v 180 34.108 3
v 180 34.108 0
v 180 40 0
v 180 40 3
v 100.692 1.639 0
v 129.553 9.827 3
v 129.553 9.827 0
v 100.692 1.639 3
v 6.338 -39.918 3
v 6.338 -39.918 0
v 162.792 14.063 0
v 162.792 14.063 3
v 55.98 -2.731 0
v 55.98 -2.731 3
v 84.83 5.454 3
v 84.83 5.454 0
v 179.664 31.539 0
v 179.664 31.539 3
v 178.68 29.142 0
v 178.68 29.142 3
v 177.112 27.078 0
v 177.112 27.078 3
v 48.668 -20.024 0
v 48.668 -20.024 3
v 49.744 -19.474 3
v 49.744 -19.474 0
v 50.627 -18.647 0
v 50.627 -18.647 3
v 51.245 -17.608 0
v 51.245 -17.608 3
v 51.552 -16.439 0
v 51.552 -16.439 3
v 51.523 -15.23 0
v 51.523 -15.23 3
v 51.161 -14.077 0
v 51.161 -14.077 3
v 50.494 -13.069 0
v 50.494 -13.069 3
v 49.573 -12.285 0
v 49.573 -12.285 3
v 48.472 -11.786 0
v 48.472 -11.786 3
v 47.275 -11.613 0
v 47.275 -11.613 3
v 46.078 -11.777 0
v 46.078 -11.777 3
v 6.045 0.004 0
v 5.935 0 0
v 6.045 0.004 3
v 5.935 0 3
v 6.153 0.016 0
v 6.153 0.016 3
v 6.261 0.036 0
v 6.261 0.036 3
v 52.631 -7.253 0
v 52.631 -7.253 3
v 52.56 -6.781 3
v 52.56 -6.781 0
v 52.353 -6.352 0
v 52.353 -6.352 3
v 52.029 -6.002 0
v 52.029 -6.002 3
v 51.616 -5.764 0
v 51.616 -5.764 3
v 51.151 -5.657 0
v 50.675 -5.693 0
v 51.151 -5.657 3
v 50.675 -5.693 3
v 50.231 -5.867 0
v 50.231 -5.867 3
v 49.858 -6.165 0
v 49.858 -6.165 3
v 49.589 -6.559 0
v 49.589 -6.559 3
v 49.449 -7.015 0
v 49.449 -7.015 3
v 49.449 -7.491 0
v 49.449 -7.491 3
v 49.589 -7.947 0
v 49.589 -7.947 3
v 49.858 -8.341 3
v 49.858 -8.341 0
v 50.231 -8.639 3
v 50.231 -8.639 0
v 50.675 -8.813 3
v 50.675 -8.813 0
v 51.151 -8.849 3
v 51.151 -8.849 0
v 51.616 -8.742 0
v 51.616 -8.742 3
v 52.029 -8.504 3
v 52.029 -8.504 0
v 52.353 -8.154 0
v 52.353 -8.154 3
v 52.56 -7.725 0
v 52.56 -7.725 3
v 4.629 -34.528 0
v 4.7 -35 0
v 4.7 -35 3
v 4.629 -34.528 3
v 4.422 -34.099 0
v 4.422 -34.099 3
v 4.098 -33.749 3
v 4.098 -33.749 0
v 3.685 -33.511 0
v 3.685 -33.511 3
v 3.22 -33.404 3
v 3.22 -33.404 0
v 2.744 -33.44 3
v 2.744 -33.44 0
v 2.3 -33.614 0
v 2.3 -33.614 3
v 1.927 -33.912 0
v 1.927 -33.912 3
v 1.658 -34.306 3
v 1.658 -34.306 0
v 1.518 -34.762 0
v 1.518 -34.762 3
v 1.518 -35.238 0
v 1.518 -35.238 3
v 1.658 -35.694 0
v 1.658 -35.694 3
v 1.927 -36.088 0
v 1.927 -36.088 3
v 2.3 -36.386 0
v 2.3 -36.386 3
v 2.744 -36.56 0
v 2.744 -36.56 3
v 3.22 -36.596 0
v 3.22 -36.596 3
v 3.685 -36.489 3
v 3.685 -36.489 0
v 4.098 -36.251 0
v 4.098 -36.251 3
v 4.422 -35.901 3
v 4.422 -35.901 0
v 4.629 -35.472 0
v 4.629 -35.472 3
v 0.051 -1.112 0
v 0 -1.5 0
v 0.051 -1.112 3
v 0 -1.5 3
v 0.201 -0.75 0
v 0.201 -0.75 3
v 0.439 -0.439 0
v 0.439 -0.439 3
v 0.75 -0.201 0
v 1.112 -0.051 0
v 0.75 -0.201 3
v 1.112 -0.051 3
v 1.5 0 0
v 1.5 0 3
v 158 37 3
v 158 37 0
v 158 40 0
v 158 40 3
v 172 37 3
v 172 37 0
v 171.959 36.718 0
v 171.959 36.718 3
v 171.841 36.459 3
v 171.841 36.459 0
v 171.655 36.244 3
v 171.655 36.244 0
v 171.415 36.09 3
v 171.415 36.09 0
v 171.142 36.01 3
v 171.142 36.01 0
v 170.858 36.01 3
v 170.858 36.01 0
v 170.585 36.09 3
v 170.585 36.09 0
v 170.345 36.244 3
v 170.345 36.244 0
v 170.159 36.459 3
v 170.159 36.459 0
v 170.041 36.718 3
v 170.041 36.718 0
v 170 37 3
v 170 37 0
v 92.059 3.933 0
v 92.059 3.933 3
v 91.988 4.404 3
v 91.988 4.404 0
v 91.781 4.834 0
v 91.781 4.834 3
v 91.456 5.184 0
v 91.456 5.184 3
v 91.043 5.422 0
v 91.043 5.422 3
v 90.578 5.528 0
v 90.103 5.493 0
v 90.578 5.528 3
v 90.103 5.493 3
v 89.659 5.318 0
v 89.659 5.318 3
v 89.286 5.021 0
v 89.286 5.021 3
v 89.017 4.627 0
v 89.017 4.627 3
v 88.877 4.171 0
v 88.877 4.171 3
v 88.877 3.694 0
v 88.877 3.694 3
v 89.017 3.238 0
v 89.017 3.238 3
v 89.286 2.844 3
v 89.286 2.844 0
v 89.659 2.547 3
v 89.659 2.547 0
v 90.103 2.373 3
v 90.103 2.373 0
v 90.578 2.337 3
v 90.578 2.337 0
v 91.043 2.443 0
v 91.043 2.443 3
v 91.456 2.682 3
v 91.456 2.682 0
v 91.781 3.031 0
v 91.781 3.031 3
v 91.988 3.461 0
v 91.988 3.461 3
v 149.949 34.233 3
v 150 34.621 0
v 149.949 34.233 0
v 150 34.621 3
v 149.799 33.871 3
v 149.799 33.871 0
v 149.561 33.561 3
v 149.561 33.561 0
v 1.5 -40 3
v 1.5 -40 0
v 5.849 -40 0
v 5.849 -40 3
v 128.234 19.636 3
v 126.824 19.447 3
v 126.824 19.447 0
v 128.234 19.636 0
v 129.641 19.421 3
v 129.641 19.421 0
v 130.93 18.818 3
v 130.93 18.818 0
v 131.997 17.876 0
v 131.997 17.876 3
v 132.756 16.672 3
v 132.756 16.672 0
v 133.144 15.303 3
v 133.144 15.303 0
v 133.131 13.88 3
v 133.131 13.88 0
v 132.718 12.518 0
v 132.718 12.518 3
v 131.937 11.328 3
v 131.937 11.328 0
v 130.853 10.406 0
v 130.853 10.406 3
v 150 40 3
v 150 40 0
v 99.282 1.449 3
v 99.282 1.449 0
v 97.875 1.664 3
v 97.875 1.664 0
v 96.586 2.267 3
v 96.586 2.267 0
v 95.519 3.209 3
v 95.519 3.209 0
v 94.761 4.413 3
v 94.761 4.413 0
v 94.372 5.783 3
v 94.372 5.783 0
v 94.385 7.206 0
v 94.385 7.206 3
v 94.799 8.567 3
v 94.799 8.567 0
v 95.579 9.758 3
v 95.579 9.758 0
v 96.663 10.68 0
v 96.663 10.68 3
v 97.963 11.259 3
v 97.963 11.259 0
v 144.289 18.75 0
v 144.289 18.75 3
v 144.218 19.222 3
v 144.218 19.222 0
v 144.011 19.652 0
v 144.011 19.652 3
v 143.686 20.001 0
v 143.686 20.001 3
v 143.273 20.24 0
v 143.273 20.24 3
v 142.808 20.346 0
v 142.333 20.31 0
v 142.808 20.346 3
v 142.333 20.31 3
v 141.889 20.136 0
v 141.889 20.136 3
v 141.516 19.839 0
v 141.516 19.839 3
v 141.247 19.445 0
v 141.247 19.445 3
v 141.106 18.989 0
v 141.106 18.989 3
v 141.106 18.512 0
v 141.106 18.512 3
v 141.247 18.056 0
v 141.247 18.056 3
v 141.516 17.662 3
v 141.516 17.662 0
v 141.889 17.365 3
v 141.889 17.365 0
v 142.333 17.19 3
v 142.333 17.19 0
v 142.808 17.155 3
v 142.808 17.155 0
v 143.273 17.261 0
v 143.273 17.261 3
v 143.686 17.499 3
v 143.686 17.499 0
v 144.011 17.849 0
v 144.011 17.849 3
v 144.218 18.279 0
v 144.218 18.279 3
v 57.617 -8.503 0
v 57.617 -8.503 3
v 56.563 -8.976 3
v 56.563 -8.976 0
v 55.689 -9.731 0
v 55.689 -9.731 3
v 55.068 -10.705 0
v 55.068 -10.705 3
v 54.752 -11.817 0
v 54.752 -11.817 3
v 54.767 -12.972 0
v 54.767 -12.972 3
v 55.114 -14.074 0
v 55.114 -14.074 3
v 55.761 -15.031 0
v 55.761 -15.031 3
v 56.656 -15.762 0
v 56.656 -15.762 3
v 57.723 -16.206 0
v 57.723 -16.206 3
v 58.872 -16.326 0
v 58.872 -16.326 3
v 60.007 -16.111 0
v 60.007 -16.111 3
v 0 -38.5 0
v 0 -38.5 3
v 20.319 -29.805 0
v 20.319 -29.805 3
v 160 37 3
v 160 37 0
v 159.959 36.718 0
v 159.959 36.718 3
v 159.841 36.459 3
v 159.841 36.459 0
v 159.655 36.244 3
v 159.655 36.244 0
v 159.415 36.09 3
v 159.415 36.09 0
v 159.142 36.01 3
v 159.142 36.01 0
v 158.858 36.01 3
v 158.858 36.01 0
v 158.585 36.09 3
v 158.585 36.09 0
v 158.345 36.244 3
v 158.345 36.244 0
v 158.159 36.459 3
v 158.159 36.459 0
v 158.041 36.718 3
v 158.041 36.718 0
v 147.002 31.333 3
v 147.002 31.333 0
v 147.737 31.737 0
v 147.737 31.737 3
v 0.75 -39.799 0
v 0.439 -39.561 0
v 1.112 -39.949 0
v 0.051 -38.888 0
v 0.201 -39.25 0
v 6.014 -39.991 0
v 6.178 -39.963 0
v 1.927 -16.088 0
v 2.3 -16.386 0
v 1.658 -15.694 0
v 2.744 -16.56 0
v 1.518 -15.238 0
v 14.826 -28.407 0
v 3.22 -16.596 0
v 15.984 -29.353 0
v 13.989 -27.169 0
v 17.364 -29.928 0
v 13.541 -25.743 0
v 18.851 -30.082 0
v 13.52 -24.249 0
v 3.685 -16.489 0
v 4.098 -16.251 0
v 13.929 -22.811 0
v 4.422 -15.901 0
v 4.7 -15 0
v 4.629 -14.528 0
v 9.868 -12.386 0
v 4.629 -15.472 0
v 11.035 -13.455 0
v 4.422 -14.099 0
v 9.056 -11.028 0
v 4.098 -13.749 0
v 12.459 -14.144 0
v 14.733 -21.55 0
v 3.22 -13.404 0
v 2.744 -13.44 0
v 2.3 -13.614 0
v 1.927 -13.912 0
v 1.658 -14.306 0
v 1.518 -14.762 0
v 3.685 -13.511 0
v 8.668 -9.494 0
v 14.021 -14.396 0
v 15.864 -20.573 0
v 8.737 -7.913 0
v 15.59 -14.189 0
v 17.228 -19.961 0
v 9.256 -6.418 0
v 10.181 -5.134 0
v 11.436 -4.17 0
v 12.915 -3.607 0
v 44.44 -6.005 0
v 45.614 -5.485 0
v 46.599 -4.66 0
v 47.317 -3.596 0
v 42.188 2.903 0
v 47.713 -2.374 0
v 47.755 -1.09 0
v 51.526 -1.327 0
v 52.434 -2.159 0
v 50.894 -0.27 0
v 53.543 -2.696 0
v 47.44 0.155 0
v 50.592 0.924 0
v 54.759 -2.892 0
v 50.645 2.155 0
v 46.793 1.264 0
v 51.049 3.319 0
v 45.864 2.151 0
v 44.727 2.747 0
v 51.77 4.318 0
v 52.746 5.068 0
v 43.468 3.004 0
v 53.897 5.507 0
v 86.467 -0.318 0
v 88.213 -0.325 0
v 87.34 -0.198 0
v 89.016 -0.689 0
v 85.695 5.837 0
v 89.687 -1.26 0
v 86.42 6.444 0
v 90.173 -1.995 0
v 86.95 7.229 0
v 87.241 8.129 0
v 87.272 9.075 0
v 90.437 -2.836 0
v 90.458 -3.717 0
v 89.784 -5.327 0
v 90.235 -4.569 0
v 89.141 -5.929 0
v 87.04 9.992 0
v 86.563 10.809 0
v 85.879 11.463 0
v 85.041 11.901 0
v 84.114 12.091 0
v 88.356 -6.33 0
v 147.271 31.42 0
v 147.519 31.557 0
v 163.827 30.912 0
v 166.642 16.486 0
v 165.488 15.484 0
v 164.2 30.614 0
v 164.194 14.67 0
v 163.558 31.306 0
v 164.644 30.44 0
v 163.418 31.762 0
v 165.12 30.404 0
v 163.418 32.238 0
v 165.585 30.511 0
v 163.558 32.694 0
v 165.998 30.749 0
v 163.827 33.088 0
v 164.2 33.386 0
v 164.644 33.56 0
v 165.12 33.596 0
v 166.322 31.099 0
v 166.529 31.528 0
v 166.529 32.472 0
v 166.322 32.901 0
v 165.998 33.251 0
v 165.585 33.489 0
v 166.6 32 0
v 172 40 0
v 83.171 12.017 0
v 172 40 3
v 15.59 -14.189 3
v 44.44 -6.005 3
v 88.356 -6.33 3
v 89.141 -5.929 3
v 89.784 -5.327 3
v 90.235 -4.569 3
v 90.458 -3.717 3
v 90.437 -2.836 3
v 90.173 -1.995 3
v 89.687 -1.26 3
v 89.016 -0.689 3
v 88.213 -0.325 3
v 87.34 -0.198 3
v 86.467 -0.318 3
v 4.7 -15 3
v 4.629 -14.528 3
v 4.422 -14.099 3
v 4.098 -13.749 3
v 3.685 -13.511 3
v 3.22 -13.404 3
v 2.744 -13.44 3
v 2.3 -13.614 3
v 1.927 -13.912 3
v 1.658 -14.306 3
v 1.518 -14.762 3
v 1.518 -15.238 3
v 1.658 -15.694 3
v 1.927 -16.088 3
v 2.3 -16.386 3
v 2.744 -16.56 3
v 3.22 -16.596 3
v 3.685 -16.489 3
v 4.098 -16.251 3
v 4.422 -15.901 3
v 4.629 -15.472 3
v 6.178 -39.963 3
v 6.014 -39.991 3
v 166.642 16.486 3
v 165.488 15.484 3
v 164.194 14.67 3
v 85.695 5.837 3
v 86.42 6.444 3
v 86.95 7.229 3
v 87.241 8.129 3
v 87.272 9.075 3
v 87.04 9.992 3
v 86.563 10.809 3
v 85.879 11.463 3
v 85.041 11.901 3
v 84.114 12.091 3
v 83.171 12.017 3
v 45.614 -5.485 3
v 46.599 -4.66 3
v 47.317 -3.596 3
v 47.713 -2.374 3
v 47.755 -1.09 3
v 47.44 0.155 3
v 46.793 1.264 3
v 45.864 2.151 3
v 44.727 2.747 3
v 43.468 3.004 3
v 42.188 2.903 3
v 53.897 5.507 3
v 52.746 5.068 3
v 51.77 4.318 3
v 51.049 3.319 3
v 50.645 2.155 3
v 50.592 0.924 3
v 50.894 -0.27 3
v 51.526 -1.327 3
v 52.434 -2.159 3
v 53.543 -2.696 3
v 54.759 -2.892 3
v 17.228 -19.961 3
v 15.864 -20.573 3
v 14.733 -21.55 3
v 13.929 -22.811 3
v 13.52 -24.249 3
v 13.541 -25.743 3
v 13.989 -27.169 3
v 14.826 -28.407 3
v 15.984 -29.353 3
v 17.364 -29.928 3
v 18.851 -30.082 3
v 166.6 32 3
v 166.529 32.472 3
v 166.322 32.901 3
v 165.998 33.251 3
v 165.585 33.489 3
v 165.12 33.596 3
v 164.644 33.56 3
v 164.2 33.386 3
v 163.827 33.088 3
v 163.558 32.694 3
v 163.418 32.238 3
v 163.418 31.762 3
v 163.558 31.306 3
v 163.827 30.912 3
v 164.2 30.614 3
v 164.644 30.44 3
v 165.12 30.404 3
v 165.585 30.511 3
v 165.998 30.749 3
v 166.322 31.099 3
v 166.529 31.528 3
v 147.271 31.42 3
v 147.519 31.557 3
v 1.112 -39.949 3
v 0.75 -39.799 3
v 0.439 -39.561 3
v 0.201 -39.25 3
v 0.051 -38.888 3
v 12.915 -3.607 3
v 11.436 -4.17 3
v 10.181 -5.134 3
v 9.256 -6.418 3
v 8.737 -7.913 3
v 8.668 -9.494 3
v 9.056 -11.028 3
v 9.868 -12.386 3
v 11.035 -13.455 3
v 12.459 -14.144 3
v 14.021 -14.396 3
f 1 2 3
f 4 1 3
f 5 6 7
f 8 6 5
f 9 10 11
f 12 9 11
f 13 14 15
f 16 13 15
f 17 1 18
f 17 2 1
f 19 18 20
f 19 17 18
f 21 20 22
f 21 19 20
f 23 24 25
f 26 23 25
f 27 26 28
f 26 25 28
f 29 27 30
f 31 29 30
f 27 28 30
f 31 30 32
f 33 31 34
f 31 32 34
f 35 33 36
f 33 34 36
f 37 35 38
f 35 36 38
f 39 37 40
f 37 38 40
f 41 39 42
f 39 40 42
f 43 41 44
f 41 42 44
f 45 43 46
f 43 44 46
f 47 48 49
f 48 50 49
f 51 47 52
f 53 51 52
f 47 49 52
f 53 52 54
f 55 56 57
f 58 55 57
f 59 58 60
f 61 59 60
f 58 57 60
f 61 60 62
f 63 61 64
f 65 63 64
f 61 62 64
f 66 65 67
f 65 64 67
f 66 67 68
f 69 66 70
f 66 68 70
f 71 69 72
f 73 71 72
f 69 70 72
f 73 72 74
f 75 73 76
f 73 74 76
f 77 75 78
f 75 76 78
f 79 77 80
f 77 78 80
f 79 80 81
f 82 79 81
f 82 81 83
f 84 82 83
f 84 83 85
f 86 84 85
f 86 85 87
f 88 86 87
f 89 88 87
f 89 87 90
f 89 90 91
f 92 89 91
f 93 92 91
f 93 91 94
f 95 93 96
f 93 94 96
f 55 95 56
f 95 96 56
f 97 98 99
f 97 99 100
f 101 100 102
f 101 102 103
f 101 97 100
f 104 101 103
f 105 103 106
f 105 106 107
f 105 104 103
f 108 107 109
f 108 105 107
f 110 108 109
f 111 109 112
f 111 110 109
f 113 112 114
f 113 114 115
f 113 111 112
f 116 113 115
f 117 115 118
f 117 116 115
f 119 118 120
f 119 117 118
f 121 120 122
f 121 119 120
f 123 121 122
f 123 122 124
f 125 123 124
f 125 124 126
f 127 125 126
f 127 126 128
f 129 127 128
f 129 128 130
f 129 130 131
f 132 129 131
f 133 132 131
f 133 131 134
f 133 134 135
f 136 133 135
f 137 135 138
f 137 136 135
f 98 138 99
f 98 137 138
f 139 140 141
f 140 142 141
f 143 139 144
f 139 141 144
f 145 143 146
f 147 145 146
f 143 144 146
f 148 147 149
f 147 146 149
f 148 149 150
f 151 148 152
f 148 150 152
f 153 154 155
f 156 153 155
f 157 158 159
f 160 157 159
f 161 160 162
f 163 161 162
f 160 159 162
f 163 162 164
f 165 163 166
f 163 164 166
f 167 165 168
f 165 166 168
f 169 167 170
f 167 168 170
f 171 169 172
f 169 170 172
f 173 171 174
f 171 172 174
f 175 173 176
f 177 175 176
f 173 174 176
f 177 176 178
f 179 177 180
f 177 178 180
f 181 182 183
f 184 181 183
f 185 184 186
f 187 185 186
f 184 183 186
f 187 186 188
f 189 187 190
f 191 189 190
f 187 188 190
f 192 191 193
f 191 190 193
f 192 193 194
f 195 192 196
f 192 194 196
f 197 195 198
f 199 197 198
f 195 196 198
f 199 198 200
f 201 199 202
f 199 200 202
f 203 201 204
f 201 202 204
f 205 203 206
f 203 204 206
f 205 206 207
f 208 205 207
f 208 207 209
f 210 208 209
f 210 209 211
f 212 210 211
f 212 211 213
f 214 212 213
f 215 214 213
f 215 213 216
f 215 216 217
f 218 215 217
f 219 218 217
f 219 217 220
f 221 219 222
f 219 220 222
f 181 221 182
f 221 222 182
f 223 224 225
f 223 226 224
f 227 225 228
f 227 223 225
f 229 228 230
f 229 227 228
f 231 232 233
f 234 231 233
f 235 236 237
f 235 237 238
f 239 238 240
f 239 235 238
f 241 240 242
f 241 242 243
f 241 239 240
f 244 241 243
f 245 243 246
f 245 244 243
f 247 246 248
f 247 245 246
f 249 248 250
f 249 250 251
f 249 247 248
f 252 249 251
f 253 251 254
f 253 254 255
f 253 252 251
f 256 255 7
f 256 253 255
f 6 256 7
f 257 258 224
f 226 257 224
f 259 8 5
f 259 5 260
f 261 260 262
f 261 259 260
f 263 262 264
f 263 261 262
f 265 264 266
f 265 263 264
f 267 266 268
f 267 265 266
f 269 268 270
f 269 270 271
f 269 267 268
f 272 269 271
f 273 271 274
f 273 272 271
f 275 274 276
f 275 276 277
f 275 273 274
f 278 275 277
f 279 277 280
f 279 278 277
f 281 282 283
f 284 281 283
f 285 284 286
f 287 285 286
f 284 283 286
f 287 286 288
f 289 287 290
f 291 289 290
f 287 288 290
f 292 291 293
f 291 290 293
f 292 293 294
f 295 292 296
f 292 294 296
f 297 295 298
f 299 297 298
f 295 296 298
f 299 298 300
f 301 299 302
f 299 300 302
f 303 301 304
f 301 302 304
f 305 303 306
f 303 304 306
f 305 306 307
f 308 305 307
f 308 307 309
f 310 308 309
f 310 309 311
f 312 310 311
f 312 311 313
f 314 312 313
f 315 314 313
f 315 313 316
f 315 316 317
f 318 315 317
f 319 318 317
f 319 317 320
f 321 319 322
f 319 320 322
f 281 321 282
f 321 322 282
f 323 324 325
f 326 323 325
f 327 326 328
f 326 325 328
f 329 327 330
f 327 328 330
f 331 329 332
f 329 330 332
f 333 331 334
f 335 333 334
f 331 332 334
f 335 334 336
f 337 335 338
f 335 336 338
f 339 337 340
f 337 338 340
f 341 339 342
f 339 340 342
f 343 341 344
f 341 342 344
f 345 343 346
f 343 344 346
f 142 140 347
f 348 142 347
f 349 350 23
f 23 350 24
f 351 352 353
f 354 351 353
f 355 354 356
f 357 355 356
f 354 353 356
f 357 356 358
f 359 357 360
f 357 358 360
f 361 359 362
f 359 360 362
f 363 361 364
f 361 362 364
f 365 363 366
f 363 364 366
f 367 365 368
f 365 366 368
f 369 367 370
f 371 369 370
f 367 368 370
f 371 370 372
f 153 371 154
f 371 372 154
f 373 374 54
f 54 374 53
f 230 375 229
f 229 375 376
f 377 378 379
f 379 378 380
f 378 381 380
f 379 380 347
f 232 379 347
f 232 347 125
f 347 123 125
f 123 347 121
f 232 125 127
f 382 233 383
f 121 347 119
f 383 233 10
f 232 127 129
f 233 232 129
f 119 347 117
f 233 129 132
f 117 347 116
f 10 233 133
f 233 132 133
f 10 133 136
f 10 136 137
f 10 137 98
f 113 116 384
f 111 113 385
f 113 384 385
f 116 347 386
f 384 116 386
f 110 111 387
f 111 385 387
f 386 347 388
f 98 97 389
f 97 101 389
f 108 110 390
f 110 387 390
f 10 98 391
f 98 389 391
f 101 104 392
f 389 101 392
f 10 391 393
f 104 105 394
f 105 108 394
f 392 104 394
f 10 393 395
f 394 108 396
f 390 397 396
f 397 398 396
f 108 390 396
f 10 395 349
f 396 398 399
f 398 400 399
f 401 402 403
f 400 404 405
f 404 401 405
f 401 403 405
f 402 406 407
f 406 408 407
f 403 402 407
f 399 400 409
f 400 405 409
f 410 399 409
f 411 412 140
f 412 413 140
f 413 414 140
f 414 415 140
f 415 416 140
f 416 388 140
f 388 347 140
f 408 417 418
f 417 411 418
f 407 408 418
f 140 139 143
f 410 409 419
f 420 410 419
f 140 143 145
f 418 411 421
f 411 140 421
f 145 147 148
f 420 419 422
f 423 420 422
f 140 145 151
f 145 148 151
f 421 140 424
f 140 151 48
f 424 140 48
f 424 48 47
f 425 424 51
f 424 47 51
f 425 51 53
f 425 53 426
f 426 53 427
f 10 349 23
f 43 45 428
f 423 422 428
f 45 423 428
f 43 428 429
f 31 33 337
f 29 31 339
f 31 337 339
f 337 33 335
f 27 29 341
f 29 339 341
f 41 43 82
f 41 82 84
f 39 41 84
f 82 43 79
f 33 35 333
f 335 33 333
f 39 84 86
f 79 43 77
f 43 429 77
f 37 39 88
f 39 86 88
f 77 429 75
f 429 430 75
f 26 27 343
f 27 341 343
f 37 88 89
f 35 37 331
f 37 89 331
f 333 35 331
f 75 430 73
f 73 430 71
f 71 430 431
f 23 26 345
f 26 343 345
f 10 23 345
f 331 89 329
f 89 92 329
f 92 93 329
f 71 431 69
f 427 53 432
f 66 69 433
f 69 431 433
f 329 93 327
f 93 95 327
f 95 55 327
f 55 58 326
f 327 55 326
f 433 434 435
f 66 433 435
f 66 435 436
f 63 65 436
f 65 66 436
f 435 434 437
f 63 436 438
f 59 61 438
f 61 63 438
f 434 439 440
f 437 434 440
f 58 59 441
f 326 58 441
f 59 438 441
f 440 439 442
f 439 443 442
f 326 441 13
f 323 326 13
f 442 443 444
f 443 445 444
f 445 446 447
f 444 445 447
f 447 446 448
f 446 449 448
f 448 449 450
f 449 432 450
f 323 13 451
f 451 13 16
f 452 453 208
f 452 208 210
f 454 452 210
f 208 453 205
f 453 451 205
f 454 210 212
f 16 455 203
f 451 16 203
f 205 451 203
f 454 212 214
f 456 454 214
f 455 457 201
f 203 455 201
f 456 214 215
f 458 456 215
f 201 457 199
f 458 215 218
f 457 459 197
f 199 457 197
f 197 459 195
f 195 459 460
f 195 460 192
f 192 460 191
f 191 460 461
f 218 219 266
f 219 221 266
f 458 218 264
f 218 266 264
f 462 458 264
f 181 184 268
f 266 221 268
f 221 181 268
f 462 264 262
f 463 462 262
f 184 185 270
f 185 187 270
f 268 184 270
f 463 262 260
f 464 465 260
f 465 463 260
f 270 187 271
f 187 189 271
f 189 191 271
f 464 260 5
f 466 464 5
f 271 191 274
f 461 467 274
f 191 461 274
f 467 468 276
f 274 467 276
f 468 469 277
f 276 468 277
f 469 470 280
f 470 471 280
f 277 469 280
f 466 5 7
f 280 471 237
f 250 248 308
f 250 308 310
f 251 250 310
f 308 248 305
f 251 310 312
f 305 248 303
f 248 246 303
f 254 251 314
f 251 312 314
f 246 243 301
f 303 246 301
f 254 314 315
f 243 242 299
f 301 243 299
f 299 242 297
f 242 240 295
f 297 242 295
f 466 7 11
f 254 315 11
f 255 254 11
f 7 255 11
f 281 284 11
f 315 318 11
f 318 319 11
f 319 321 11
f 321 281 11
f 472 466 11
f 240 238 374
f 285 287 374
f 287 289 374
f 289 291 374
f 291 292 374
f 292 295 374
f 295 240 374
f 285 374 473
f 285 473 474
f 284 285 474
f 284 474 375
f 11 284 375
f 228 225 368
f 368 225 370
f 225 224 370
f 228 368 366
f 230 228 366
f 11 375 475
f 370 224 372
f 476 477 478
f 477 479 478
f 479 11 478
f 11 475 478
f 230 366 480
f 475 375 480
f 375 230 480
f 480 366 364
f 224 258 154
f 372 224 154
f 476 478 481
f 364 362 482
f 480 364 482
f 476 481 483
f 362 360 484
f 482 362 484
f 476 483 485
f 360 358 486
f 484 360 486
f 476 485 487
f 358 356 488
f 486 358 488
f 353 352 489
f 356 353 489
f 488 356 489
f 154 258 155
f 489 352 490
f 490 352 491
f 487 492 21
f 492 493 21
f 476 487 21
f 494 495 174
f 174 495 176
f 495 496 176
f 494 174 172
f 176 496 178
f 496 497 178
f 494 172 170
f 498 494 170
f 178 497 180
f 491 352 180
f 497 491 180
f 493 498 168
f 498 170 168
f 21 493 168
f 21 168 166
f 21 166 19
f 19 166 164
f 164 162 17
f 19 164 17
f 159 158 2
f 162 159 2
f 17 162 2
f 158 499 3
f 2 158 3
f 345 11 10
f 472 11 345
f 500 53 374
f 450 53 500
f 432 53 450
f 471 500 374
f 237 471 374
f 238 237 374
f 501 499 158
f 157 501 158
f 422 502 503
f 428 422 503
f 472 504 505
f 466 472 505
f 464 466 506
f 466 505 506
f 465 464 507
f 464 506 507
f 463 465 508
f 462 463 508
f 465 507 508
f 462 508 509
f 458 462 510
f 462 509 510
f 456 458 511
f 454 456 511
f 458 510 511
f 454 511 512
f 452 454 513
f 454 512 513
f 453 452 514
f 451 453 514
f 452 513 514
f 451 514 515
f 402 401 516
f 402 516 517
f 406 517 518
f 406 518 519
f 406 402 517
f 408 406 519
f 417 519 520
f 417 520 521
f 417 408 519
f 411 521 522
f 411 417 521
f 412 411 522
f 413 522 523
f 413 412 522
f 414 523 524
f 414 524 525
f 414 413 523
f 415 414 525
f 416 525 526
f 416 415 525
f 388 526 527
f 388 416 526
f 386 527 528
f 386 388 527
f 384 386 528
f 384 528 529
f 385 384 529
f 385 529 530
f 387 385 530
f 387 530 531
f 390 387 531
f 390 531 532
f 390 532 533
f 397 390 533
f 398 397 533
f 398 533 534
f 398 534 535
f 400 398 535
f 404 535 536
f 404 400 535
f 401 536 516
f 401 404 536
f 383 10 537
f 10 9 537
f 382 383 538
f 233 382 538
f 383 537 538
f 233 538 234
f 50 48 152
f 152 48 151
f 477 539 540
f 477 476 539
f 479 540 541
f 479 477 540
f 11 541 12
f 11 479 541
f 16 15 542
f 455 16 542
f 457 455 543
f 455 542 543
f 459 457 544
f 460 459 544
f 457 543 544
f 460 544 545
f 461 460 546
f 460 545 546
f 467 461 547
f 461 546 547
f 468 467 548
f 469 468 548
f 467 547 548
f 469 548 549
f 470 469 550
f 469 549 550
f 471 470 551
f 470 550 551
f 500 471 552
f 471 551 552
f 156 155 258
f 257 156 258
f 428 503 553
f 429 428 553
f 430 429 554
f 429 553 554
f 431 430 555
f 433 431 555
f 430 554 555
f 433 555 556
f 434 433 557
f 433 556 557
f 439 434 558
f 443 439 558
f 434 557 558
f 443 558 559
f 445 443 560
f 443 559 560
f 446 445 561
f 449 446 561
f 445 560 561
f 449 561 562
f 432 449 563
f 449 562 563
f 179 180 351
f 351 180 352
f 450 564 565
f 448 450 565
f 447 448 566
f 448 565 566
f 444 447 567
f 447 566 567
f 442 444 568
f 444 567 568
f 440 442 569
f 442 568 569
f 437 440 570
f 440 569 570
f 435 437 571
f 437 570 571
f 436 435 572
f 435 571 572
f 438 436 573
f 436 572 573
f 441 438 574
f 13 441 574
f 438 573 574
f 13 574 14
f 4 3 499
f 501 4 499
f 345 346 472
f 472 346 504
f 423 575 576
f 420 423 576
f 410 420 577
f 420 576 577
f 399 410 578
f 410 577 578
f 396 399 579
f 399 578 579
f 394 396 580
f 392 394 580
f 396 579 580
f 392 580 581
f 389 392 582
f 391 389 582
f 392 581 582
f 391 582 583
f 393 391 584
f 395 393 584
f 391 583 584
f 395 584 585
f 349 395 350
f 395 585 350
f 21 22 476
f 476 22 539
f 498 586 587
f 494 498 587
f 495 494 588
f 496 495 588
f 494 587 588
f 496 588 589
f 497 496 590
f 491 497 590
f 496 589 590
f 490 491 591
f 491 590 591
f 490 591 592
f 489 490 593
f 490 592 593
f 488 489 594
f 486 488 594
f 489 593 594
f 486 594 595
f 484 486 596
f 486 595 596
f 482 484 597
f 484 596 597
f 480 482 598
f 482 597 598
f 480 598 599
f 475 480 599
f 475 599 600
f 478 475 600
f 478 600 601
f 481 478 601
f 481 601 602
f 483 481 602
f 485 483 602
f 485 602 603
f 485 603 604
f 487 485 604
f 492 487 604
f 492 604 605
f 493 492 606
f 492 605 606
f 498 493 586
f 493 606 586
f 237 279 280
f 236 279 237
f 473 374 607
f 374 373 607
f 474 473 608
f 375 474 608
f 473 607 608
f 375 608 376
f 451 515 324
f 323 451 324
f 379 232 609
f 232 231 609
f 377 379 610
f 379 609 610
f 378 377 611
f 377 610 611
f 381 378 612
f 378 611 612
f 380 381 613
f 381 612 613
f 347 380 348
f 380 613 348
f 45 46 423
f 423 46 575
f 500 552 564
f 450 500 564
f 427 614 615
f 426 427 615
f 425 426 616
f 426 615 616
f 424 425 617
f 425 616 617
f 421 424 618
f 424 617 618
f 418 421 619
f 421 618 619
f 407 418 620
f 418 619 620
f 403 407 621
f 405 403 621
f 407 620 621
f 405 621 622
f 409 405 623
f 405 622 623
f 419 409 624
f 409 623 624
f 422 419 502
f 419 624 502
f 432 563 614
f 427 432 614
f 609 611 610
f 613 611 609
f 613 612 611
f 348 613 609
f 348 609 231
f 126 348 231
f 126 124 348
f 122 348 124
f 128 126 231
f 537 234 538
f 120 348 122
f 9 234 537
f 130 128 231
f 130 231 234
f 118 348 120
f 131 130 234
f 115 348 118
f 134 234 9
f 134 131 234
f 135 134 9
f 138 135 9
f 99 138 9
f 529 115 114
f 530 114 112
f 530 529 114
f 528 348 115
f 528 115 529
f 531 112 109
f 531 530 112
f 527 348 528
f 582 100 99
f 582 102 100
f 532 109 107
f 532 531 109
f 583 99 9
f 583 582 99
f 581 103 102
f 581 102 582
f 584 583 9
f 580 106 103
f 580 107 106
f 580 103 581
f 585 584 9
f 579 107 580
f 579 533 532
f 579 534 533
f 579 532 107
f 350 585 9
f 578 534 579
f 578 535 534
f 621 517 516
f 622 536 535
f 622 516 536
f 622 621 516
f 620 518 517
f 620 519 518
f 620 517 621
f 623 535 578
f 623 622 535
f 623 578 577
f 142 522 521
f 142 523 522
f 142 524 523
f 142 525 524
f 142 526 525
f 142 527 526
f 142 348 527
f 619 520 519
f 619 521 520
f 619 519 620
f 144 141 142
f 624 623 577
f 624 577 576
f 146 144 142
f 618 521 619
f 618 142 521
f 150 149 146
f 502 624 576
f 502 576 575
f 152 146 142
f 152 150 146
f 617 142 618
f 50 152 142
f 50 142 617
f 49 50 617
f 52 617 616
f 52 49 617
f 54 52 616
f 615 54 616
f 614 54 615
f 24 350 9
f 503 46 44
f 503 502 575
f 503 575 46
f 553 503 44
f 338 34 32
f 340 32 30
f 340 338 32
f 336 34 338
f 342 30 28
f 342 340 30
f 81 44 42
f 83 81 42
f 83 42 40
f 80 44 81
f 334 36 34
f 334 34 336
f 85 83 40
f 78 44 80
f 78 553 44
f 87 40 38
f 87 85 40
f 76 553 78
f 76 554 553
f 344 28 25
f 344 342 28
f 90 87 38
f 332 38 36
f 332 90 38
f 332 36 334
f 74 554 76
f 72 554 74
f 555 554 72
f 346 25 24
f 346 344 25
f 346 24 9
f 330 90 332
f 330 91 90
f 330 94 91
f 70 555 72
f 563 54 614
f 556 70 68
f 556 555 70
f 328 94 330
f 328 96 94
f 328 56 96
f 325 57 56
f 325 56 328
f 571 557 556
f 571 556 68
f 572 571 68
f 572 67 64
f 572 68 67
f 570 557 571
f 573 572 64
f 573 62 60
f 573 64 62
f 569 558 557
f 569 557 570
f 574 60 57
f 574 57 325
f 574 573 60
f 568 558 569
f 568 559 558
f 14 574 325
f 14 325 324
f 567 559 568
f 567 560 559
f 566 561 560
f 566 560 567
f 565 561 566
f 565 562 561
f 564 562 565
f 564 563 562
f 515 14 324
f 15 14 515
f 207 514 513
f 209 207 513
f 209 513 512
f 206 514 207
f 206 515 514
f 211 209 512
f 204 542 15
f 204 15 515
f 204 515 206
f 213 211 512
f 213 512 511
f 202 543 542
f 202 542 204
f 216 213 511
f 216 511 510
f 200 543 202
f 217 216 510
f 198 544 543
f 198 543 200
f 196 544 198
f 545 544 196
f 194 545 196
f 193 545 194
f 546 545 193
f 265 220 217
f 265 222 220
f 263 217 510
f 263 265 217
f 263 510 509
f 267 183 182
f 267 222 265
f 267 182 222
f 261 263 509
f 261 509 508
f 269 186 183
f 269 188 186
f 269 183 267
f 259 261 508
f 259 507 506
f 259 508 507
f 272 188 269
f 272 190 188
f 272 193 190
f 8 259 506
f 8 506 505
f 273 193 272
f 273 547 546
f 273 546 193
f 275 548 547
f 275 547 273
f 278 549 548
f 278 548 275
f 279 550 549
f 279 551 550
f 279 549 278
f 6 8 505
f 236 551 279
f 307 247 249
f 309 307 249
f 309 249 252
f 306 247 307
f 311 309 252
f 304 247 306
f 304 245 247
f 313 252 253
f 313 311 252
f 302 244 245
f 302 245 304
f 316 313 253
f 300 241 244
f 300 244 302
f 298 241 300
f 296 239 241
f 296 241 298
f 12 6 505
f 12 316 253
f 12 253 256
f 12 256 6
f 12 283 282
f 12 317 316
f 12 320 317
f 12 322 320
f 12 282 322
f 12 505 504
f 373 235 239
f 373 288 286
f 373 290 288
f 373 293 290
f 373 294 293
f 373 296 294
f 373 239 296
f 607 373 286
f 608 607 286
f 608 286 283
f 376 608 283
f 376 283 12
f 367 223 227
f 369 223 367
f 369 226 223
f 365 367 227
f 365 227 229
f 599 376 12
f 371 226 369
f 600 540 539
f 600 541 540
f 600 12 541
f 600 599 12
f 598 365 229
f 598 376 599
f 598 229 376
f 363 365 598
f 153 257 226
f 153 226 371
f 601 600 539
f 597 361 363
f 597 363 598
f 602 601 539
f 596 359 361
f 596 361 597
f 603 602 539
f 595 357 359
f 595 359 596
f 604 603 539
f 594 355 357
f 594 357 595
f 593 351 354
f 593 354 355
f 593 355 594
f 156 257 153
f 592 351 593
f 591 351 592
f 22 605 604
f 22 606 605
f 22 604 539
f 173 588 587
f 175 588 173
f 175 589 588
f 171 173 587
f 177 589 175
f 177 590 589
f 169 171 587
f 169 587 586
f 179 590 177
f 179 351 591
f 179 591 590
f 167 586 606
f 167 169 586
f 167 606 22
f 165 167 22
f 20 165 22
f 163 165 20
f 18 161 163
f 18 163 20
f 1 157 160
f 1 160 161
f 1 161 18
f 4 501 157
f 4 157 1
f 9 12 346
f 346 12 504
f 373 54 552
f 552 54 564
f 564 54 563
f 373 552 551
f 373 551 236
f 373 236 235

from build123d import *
from OCP.BRepFilletAPI import BRepFilletAPI_MakeChamfer

# Parameters (mm, degrees)
SKETCH_1_R          = 1.6
EXTRUDE_1_DEPTH     = 3
SKETCH_2_R          = 1.6
CUT_EXTRUDE_1_DEPTH = 3
CHAMFER_1_SIZE      = 2
CHAMFER_1_SIZE2     = 3.230198514
CHAMFER_1_SIZE2_2   = 2.634764865
SKETCH_3_R          = 1.6
CUT_EXTRUDE_2_DEPTH = 3
CUT_EXTRUDE_3_DEPTH = 3
FILLET_1_R          = 10
FILLET_2_R          = 1.5


with BuildPart() as part:
    # 草图1 → 凸台-拉伸1 (new body)
    with BuildSketch(Plane.XY):
        with BuildLine():
            Line((150, 32), (6.1, 0))
            Line((6.1, 0), (0, 0))
            Line((0, 0), (0, -40))
            Line((0, -40), (6.1, -40))
            Line((6.1, -40), (180, 20))
            Line((180, 20), (180, 40))
            Line((180, 40), (172, 40))
            Line((172, 40), (172, 37))
            ThreePointArc((172, 37), (171, 36), (170, 37))
            Line((170, 37), (160, 37))
            ThreePointArc((160, 37), (159, 36), (158, 37))
            Line((158, 37), (158, 40))
            Line((158, 40), (150, 40))
            Line((150, 40), (150, 32))
        make_face()
        with Locations((3.1, -35)):
            Circle(SKETCH_1_R, mode=Mode.SUBTRACT)
        with Locations((3.1, -15)):
            Circle(SKETCH_1_R, mode=Mode.SUBTRACT)
    extrude(amount=EXTRUDE_1_DEPTH)

    # 草图2 → 切除-拉伸1 (cut)
    with BuildSketch(Plane.XY.offset(3)):
        with Locations((165, 32)):
            Circle(SKETCH_2_R)
    extrude(amount=-CUT_EXTRUDE_1_DEPTH, mode=Mode.SUBTRACT)

    # 倒角1: one chamfer whose edges measure the first distance from different faces: ONE call of the kernel's chamfer builder (chamfer() names one face for all edges)
    chamfer_1_edges_1 = [part.edges().sort_by_distance(p)[0] for p in [
        (180, 20, 1.5),
    ]]
    chamfer_1_side_1 = [part.faces().sort_by_distance(p)[0] for p in [
        (93.05, -10, 1.5),
    ]]
    chamfer_1_edges_2 = [part.edges().sort_by_distance(p)[0] for p in [
        (150, 32, 1.5),
    ]]
    chamfer_1_side_2 = [part.faces().sort_by_distance(p)[0] for p in [
        (150, 36, 1.5),
    ]]
    chamfer_1 = BRepFilletAPI_MakeChamfer(part.part.solid().wrapped)
    for e in chamfer_1_edges_1:
        chamfer_1.Add(CHAMFER_1_SIZE, CHAMFER_1_SIZE2, e.wrapped, chamfer_1_side_1[0].wrapped)  # the first distance lies on this face
    for e in chamfer_1_edges_2:
        chamfer_1.Add(CHAMFER_1_SIZE, CHAMFER_1_SIZE2_2, e.wrapped, chamfer_1_side_2[0].wrapped)  # the first distance lies on this face
    add(Compound.cast(chamfer_1.Shape()), mode=Mode.REPLACE)

    # 草图3 → 切除-拉伸2 (cut)
    with BuildSketch(Plane.XY.offset(3)):
        with Locations((51.030979005, -7.253024477)):
            Circle(SKETCH_3_R)
        with Locations((90.458641741, 3.932653266)):
            Circle(SKETCH_3_R)
        with Locations((142.688604417, 18.75035968)):
            Circle(SKETCH_3_R)
        with BuildLine():
            Line((20.319493435, -29.80466571), (48.667912828, -20.023727449))
            ThreePointArc((48.667912828, -20.023727449), (51.382781252, -14.640684155), (46.077566644, -11.776707266))
            Line((46.077566644, -11.776707266), (17.22778338, -19.961427236))
            ThreePointArc((17.22778338, -19.961427236), (13.712756492, -26.472643184), (20.319493435, -29.80466571))
        make_face()
        with BuildLine():
            Line((97.96293832, 11.258954093), (126.823953345, 19.446860527))
            ThreePointArc((126.823953345, 19.446860527), (132.998773588, 16.001342428), (129.553255489, 9.826522185))
            Line((129.553255489, 9.826522185), (100.692240465, 1.638615751))
            ThreePointArc((100.692240465, 1.638615751), (94.517420222, 5.08413385), (97.96293832, 11.258954093))
        make_face()
        with BuildLine():
            Line((60.007280586, -16.111352144), (88.355699979, -6.330413883))
            ThreePointArc((88.355699979, -6.330413883), (90.334917033, -2.406020717), (86.467263213, -0.318099309))
            Line((86.467263213, -0.318099309), (57.617479949, -8.502819279))
            ThreePointArc((57.617479949, -8.502819279), (54.900467894, -13.53579706), (60.007280586, -16.111352144))
        make_face()
        with BuildLine():
            Line((15.590202093, -14.189224231), (44.439985357, -6.004504261))
            ThreePointArc((44.439985357, -6.004504261), (47.641256823, -0.456756962), (42.188030072, 2.902998549))
            Line((42.188030072, 2.902998549), (12.91477289, -3.60669033))
            ThreePointArc((12.91477289, -3.60669033), (8.806536259, -10.274778475), (15.590202093, -14.189224231))
        make_face()
        with BuildLine():
            Line((55.979898663, -2.730616274), (84.829681926, 5.454103696))
            ThreePointArc((84.829681926, 5.454103696), (87.188167139, 9.5413172), (83.170590126, 12.016562981))
            Line((83.170590126, 12.016562981), (53.897332945, 5.506874101))
            ThreePointArc((53.897332945, 5.506874101), (50.699463699, 0.316405313), (55.979898663, -2.730616274))
        make_face()
    extrude(amount=-CUT_EXTRUDE_2_DEPTH, mode=Mode.SUBTRACT)

    # 草图4 → 切除-拉伸3 (cut)
    with BuildSketch(Plane.XY.offset(3)):
        Polygon((180, 30), (165, 14.824611846), (178.109369602, 19.347683589), (180, 23.230198514), align=None)
    extrude(amount=-CUT_EXTRUDE_3_DEPTH, mode=Mode.SUBTRACT)

    # 圆角1
    fillet_1_edges = [part.edges().sort_by_distance(p)[0] for p in [
        (180, 30, 1.5),
        (165, 14.824611846, 1.5),
    ]]
    fillet(fillet_1_edges, radius=FILLET_1_R)

    # 圆角2
    fillet_2_edges = [part.edges().sort_by_distance(p)[0] for p in [
        (6.1, -40, 1.5),
        (0, -40, 1.5),
        (0, 0, 1.5),
        (6.1, 0, 1.5),
        (147.428060769, 31.428060769, 1.5),
        (150, 34, 1.5),
    ]]
    fillet(fillet_2_edges, radius=FILLET_2_R)


solid = part.part
